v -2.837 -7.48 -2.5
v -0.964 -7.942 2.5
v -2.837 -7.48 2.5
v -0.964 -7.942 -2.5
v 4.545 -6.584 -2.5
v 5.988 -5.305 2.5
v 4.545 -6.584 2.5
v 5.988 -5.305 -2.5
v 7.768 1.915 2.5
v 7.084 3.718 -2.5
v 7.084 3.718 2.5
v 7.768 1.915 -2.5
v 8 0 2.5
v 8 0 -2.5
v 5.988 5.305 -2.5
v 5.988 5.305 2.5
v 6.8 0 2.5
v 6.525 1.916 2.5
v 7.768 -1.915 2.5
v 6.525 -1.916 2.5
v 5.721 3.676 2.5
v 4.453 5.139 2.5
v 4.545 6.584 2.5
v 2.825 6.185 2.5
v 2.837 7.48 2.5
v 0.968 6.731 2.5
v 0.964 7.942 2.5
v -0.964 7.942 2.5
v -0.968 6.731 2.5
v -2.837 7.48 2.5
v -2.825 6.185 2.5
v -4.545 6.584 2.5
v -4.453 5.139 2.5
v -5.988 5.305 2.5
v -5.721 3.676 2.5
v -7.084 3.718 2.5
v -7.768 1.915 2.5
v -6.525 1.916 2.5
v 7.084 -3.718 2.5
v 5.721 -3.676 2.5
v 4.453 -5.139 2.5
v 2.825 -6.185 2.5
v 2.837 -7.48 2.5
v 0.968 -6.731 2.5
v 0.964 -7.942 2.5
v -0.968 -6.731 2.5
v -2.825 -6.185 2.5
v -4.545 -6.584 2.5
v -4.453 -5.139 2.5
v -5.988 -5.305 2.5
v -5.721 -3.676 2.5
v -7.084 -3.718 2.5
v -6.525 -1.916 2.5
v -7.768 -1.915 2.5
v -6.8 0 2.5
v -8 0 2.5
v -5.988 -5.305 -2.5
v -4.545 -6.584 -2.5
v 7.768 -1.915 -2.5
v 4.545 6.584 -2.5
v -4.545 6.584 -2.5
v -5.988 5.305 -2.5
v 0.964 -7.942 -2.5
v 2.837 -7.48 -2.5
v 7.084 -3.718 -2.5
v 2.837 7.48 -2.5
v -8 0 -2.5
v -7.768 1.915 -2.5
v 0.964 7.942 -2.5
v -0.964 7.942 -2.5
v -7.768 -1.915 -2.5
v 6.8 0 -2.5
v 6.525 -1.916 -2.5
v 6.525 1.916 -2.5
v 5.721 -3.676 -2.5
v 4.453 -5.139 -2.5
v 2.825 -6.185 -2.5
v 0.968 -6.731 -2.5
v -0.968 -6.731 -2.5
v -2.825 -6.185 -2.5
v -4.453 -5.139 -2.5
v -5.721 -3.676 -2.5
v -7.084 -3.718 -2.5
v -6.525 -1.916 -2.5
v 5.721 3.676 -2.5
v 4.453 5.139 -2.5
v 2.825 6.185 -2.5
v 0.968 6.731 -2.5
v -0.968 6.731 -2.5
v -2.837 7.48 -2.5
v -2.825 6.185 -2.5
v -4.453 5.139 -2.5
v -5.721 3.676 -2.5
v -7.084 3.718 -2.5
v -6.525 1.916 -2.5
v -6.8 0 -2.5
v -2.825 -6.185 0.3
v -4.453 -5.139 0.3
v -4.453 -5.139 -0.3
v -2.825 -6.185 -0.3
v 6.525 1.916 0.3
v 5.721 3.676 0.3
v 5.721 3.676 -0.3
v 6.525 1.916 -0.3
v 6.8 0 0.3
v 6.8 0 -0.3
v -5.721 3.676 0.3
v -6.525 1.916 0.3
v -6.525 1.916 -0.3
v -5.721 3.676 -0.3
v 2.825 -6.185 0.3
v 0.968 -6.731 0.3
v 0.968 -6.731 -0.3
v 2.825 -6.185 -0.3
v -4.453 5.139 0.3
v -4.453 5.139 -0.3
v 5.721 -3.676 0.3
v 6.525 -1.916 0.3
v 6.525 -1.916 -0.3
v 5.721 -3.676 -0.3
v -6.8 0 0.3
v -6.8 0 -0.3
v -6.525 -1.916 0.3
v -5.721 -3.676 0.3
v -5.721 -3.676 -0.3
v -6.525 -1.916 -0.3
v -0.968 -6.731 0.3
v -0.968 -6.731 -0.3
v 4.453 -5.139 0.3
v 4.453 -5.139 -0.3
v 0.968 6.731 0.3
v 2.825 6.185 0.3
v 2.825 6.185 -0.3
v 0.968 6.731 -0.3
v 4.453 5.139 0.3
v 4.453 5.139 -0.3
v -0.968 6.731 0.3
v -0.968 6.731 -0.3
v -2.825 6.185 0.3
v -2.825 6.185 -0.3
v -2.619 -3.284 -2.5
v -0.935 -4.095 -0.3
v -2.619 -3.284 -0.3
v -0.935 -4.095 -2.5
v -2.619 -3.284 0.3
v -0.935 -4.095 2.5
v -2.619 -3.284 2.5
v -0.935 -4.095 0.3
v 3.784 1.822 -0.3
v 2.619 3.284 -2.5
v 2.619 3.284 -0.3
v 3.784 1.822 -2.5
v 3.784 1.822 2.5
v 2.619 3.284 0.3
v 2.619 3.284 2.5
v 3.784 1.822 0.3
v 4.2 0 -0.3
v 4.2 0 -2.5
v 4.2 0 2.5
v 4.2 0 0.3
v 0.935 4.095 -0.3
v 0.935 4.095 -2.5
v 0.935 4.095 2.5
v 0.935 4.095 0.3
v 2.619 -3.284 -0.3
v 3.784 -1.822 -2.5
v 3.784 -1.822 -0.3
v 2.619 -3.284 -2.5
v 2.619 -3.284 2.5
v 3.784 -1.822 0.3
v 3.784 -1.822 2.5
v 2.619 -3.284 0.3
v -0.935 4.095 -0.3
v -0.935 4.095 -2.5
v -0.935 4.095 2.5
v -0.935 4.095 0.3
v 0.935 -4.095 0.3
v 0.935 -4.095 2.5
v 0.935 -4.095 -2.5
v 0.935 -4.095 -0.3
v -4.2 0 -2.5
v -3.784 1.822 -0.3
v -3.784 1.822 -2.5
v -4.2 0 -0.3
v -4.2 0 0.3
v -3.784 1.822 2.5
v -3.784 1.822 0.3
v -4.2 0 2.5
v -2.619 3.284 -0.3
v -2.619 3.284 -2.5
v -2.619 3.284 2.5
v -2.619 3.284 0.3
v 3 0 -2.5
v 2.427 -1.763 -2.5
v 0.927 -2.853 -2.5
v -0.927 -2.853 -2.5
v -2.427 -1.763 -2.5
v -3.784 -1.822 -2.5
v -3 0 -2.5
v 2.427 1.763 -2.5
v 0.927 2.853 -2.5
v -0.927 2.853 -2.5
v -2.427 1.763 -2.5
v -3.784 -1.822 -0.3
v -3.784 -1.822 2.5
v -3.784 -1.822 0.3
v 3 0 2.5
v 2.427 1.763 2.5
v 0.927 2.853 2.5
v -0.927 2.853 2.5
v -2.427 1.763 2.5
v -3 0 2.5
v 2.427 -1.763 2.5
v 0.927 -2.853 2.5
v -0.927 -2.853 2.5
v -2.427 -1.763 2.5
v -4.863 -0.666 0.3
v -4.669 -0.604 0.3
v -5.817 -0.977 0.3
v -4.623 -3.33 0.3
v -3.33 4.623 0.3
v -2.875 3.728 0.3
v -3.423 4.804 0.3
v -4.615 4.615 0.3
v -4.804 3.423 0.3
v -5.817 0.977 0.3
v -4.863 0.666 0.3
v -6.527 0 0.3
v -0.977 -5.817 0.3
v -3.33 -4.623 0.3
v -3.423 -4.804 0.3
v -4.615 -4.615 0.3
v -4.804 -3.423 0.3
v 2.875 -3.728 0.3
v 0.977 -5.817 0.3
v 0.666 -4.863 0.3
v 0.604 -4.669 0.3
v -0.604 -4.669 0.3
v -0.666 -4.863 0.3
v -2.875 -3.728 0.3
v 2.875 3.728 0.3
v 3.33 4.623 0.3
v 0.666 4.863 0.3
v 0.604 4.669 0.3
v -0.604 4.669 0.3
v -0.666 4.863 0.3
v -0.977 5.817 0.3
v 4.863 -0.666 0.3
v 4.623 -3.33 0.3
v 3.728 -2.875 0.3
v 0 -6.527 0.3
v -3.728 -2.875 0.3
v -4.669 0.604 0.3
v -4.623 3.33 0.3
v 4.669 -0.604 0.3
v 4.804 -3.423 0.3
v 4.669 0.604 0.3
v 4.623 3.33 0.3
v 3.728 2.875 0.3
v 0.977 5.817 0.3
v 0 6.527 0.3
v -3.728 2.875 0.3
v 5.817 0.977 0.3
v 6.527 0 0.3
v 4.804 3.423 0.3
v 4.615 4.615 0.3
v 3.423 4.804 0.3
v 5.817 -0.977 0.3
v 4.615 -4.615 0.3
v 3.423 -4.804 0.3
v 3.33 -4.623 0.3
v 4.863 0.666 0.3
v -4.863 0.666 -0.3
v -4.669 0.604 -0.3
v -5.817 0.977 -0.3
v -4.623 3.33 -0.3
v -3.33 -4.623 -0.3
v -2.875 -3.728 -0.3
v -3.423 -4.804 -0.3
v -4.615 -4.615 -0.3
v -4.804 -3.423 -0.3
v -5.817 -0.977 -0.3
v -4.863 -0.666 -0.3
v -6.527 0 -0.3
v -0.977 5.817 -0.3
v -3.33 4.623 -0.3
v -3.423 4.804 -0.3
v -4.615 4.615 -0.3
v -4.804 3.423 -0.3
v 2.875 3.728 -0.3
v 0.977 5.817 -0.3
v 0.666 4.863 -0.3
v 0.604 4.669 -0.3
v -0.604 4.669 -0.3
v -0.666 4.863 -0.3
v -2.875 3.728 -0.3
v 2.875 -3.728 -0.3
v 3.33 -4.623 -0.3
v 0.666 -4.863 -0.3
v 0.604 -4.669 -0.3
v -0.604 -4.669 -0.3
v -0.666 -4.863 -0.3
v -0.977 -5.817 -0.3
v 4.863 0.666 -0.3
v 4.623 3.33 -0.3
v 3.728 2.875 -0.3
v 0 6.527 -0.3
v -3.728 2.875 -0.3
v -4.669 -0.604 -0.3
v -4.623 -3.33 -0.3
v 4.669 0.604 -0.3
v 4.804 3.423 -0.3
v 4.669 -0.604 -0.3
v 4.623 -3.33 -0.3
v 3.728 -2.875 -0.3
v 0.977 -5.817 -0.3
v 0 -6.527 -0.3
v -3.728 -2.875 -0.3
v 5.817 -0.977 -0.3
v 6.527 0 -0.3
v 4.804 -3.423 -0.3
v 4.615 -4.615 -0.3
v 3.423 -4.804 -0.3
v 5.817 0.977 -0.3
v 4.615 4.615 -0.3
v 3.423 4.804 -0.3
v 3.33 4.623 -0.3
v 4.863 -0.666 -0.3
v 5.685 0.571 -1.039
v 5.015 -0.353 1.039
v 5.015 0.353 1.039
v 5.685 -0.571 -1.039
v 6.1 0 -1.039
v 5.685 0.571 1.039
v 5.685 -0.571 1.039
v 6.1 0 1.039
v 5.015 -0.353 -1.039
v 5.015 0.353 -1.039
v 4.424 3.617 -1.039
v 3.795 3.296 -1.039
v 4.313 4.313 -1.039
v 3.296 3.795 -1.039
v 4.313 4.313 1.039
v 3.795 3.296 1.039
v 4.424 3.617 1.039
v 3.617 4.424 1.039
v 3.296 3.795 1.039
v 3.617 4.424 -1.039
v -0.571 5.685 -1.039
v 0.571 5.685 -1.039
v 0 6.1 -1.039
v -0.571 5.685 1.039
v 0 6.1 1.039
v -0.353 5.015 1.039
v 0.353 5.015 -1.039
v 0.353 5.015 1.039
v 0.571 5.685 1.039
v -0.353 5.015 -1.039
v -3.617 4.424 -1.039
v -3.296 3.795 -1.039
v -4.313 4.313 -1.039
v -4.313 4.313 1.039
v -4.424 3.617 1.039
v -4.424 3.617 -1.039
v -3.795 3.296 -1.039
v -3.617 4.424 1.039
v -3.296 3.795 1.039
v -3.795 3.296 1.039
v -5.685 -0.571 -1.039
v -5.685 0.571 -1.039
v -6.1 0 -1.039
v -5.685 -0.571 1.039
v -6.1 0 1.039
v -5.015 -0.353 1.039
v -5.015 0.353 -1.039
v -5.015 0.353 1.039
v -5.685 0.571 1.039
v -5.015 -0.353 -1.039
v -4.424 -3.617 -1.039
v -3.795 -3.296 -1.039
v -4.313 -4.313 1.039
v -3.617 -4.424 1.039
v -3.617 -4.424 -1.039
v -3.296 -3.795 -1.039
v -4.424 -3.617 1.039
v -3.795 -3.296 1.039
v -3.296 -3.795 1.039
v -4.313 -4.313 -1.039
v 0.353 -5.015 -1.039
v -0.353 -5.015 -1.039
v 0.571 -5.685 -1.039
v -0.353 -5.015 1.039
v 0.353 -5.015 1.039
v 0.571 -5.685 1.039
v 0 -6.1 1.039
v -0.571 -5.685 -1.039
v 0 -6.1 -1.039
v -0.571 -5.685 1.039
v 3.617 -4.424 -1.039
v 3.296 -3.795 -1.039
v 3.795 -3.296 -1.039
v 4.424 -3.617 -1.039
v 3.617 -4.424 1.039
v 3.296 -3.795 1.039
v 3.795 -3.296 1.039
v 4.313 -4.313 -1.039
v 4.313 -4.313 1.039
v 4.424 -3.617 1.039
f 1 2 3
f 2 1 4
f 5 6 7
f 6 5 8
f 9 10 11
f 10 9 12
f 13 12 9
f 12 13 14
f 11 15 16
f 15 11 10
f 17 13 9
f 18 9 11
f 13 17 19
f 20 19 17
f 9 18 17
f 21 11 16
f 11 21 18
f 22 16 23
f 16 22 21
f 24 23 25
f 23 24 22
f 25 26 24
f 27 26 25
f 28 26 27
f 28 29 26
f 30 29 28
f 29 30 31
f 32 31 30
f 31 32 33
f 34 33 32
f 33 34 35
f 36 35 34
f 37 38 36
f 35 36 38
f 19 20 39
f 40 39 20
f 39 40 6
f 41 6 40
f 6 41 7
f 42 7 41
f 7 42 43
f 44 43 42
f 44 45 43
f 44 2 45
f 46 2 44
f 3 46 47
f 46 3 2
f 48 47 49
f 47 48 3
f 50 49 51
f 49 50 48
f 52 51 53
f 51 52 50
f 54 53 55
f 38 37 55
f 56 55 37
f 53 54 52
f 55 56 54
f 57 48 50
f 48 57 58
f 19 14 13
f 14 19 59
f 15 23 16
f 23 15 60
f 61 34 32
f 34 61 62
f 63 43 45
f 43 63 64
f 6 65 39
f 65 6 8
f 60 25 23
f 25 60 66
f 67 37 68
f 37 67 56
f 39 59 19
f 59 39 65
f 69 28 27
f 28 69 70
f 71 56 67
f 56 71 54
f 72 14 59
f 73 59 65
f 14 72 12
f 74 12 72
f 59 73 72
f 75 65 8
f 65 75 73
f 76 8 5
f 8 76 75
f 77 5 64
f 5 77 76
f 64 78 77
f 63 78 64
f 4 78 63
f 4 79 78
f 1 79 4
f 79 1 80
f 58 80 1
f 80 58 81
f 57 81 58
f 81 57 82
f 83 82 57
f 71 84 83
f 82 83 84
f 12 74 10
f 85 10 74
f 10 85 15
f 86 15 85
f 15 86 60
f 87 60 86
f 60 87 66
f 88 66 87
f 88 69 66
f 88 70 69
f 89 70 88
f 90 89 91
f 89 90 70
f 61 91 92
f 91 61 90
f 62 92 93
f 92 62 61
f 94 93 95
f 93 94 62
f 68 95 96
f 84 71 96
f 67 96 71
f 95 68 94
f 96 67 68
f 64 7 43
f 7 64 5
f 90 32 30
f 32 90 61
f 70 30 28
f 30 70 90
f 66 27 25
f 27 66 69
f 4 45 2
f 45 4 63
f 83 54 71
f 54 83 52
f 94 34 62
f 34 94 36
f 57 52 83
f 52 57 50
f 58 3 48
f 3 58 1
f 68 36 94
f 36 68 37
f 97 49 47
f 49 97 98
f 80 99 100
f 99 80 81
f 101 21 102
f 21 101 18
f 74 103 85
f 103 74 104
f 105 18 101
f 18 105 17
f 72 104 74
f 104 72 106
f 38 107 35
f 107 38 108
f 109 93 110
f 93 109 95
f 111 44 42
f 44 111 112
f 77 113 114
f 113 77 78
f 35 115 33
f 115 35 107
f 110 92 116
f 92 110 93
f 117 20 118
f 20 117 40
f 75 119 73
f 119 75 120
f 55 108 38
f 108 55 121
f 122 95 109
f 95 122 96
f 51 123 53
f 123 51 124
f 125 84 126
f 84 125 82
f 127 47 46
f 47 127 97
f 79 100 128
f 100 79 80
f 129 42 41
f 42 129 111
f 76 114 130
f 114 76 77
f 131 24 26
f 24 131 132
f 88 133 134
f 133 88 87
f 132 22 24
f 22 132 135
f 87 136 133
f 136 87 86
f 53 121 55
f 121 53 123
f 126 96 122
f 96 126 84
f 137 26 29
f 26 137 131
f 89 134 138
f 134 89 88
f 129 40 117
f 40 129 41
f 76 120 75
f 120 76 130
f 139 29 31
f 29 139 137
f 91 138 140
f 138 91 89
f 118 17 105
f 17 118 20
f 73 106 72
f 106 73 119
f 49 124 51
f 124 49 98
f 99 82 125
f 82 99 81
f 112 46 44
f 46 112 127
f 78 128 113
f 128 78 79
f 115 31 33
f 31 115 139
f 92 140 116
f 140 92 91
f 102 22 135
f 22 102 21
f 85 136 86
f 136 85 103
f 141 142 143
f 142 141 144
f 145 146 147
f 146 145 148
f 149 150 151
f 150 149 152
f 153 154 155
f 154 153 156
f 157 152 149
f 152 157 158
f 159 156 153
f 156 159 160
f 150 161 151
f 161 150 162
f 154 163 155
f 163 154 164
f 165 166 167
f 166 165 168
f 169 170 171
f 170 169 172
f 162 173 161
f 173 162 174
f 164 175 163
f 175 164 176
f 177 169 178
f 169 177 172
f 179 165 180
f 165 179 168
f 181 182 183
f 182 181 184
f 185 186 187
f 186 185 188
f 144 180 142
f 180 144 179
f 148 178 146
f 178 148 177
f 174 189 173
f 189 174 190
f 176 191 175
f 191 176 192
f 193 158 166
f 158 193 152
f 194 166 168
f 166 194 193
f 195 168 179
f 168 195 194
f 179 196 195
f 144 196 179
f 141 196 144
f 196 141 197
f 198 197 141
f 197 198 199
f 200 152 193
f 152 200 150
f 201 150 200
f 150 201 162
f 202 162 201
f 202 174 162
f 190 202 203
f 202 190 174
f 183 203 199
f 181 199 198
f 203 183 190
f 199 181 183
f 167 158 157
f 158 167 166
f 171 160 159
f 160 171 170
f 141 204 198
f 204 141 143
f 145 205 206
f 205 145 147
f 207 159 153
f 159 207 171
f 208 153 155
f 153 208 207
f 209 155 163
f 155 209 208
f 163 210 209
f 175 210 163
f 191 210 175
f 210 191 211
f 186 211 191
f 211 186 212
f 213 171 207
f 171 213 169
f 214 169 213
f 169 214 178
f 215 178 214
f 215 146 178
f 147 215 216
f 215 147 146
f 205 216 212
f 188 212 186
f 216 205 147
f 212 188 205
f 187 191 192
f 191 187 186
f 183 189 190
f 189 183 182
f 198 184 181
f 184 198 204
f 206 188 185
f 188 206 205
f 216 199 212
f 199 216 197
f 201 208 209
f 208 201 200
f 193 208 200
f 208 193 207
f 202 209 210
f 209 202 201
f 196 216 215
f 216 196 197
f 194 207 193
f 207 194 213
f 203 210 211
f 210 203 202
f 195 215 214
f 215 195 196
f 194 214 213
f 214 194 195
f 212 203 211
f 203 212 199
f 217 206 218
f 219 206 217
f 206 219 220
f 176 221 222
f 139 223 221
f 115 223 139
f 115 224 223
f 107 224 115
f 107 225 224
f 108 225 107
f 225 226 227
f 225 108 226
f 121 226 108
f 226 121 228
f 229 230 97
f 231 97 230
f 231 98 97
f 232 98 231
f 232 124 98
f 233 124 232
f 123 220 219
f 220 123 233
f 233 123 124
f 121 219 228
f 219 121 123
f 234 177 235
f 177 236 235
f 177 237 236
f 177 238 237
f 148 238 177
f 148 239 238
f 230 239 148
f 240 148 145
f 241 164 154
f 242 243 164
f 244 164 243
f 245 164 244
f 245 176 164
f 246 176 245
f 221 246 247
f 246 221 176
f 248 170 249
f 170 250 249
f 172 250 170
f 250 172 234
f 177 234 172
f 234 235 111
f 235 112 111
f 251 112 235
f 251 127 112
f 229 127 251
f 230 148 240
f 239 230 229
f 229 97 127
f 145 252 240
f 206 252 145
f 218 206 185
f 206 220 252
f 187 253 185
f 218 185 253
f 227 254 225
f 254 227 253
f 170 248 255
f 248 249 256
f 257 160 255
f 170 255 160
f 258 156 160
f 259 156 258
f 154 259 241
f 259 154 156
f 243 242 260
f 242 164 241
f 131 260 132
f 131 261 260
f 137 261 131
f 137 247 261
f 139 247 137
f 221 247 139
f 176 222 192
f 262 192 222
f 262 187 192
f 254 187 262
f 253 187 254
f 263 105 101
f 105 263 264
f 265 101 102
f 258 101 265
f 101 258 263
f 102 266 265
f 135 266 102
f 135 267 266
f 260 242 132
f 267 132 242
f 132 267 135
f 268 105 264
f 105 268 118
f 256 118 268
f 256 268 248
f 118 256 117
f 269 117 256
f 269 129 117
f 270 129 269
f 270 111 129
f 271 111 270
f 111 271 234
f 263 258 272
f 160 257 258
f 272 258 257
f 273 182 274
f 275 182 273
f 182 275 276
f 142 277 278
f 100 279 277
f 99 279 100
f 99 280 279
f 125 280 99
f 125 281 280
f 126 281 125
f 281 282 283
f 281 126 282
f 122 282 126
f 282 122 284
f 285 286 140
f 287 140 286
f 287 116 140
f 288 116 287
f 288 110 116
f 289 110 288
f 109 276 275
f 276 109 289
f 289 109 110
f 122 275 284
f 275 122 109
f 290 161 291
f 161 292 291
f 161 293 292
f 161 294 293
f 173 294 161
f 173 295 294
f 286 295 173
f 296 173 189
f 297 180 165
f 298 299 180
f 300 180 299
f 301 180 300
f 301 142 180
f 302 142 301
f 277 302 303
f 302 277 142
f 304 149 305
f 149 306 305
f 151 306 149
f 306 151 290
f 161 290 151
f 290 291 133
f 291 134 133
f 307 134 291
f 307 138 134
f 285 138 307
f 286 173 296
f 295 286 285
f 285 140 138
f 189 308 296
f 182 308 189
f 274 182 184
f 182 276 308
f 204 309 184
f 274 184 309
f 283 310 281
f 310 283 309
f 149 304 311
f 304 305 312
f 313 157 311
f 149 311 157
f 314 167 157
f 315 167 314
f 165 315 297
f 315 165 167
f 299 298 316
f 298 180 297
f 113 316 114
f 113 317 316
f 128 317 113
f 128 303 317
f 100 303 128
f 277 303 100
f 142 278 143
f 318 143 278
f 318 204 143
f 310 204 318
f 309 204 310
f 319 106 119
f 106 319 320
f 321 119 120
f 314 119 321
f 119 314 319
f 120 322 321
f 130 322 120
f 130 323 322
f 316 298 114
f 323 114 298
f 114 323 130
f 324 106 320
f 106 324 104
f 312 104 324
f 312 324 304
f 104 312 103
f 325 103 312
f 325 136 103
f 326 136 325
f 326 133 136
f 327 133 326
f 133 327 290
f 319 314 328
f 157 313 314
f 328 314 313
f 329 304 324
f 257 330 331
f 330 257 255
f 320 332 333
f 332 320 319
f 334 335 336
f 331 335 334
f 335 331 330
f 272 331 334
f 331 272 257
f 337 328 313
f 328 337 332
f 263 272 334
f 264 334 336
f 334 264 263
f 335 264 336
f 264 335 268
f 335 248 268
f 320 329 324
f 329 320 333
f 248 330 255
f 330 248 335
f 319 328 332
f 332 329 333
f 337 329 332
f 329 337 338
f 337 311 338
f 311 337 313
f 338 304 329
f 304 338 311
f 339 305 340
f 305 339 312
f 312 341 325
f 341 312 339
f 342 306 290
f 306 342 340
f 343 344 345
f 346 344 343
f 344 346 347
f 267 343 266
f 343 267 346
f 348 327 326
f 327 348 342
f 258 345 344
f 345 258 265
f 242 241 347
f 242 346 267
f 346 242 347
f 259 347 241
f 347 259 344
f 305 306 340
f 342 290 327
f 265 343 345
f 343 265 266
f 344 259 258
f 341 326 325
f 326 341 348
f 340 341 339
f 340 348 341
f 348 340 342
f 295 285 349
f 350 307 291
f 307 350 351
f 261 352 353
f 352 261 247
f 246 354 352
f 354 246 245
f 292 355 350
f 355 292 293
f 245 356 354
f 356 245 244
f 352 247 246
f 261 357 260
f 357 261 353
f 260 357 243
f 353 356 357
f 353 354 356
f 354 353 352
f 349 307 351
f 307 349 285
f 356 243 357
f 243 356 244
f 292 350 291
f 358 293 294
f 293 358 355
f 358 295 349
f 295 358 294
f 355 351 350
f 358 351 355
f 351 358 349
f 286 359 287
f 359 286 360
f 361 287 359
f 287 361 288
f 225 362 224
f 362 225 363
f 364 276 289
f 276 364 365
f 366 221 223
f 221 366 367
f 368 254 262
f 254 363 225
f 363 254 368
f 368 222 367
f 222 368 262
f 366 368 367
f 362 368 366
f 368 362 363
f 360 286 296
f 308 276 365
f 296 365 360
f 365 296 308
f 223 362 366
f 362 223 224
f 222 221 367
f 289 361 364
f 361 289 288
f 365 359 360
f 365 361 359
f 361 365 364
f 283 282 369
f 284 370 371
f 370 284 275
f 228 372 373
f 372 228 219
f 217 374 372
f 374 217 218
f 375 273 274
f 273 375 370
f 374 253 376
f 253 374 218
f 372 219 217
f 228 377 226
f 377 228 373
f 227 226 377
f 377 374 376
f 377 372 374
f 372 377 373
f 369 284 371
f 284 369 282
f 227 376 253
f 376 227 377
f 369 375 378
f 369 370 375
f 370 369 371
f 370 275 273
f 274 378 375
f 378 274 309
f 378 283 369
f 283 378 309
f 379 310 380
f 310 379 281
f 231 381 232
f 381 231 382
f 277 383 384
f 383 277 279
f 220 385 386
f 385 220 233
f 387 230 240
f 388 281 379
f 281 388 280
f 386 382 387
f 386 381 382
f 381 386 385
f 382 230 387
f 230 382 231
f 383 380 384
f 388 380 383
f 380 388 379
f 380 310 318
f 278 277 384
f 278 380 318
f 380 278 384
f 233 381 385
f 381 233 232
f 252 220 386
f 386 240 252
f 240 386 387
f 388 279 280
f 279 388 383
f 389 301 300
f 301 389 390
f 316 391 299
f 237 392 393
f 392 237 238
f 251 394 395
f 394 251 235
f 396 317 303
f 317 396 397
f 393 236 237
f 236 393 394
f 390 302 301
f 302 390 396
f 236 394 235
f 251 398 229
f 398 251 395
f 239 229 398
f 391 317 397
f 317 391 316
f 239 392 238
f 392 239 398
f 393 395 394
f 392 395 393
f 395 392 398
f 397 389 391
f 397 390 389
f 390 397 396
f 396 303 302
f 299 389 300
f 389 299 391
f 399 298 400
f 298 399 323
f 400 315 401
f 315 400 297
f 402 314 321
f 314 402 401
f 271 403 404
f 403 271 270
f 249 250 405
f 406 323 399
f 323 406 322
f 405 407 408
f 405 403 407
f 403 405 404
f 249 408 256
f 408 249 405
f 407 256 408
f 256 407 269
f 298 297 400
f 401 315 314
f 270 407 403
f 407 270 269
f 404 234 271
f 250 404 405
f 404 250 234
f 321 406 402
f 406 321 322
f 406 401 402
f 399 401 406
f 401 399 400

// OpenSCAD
// Parameters
bore_diameter_mm = 6; //[3:12:0.1]
outer_diameter_mm = 16; //[8:32:0.1]
width_mm = 5; //[2.5:10:0.1]
shield_type = 0; //[0:2:1]
flange = 0; //[0:1:1]
overlap_mm = 0.8; //[0.2:2:0.1]
outer_rim_radial_mm = 1.2; //[0.6:2.4:0.1]
inner_hub_radial_mm = 1.2; //[0.6:2.4:0.1]
shield_thickness_mm = 0.6; //[0.3:1.2:0.05]
ball_diameter_mm = 2.4; //[1.2:4.8:0.1]
ball_count = 8; //[6:14:1]

// Bearing Ball - complete geometry
module bearing_ball() {
  color("Silver") {
    sphere(r=ball_diameter_mm/2);
  }
}

// Ball Bearing - complete geometry
module ball_bearing() {
  color("DimGray") {
    // Outer Race
    difference() {
      cylinder(r=outer_diameter_mm/2, h=width_mm, center=true);
      cylinder(r=outer_diameter_mm/2 - outer_rim_radial_mm, h=width_mm + 2*overlap_mm, center=true);
    }
    // Inner Race
    difference() {
      cylinder(r=bore_diameter_mm/2 + inner_hub_radial_mm, h=width_mm, center=true);
      cylinder(r=bore_diameter_mm/2, h=width_mm + 2*overlap_mm, center=true);
    }
    // Shield or Seal
    difference() {
      cylinder(r=outer_diameter_mm/2 - outer_rim_radial_mm + overlap_mm, h=shield_thickness_mm, center=true);
      cylinder(r=bore_diameter_mm/2 + inner_hub_radial_mm - overlap_mm, h=shield_thickness_mm + 2*overlap_mm, center=true);
    }
    // Bearing Balls
    for (i = [0:ball_count-1]) {
      rotate([0, 0, i*360/ball_count])
      translate([(bore_diameter_mm/2 + inner_hub_radial_mm + (outer_diameter_mm/2 - outer_rim_radial_mm))/2, 0, 0])
      bearing_ball();
    }
  }
}

// Assembly
module assembly() {
  ball_bearing();
}

assembly();
